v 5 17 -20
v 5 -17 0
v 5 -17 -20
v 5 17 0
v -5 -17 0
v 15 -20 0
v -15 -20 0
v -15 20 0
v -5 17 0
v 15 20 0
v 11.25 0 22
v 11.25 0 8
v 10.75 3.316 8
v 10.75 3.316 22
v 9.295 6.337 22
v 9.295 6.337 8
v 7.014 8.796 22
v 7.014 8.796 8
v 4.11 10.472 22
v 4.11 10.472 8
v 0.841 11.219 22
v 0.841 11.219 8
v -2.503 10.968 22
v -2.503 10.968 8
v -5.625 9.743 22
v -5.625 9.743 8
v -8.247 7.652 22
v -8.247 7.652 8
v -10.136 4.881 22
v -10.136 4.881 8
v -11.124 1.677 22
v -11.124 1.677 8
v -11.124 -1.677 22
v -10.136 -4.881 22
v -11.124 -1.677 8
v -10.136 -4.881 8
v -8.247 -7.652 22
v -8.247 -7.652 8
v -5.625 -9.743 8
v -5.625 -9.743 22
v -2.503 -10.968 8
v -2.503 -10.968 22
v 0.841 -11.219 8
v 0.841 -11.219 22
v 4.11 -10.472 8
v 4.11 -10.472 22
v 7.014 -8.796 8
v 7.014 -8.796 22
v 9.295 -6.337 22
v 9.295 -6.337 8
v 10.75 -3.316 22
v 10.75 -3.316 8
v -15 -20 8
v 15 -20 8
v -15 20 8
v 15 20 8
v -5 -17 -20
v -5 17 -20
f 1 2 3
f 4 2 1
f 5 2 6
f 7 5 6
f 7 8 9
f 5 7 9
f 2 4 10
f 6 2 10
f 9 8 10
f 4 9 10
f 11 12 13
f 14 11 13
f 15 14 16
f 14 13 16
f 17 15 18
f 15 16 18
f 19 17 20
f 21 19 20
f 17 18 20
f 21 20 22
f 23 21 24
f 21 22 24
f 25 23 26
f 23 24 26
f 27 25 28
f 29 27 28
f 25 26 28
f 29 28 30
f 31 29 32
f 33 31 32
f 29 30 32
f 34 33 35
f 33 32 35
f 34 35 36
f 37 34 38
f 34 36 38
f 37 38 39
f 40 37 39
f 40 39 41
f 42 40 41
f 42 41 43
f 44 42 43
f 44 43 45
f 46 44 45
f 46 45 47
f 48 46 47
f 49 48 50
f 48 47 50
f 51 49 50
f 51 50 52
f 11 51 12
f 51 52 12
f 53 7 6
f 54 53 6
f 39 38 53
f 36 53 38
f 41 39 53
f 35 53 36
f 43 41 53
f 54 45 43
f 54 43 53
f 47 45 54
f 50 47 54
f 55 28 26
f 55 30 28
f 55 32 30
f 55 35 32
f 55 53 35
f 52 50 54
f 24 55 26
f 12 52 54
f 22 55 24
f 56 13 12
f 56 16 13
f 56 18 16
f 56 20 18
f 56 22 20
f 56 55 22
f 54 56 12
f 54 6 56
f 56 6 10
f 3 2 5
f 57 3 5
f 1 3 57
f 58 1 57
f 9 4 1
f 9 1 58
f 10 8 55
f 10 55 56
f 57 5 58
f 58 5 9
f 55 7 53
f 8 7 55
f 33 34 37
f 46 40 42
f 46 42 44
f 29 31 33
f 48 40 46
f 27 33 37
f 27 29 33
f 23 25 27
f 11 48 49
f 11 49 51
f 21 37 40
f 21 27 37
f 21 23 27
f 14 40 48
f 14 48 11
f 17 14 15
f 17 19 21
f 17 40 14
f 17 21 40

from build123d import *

# Parameters (mm, degrees)
ESQUISSE1_W          = 30
ESQUISSE1_H          = 40
BASE_EXTRUSION_DEPTH = 8
ESQUISSE2_W          = 10
ESQUISSE2_H          = 34
BOSS_EXTRU_1_DEPTH   = 20
ESQUISSE3_R          = 11.25
BOSS_EXTRU_2_DEPTH   = 14


with BuildPart() as part:
    # Esquisse1 → Base-Extrusion (new body)
    with BuildSketch(Plane.XY):
        Rectangle(ESQUISSE1_W, ESQUISSE1_H)
    extrude(amount=BASE_EXTRUSION_DEPTH)

    # Esquisse2 → Boss.-Extru.1 (add)
    with BuildSketch(Plane(origin=(0, 0, 0), x_dir=(-1, 0, 0), z_dir=(0, 0, -1))):
        Rectangle(ESQUISSE2_W, ESQUISSE2_H)
    extrude(amount=BOSS_EXTRU_1_DEPTH)

    # Esquisse3 → Boss.-Extru.2 (add)
    with BuildSketch(Plane.XY.offset(8)):
        Circle(ESQUISSE3_R)
    extrude(amount=BOSS_EXTRU_2_DEPTH)


solid = part.part
